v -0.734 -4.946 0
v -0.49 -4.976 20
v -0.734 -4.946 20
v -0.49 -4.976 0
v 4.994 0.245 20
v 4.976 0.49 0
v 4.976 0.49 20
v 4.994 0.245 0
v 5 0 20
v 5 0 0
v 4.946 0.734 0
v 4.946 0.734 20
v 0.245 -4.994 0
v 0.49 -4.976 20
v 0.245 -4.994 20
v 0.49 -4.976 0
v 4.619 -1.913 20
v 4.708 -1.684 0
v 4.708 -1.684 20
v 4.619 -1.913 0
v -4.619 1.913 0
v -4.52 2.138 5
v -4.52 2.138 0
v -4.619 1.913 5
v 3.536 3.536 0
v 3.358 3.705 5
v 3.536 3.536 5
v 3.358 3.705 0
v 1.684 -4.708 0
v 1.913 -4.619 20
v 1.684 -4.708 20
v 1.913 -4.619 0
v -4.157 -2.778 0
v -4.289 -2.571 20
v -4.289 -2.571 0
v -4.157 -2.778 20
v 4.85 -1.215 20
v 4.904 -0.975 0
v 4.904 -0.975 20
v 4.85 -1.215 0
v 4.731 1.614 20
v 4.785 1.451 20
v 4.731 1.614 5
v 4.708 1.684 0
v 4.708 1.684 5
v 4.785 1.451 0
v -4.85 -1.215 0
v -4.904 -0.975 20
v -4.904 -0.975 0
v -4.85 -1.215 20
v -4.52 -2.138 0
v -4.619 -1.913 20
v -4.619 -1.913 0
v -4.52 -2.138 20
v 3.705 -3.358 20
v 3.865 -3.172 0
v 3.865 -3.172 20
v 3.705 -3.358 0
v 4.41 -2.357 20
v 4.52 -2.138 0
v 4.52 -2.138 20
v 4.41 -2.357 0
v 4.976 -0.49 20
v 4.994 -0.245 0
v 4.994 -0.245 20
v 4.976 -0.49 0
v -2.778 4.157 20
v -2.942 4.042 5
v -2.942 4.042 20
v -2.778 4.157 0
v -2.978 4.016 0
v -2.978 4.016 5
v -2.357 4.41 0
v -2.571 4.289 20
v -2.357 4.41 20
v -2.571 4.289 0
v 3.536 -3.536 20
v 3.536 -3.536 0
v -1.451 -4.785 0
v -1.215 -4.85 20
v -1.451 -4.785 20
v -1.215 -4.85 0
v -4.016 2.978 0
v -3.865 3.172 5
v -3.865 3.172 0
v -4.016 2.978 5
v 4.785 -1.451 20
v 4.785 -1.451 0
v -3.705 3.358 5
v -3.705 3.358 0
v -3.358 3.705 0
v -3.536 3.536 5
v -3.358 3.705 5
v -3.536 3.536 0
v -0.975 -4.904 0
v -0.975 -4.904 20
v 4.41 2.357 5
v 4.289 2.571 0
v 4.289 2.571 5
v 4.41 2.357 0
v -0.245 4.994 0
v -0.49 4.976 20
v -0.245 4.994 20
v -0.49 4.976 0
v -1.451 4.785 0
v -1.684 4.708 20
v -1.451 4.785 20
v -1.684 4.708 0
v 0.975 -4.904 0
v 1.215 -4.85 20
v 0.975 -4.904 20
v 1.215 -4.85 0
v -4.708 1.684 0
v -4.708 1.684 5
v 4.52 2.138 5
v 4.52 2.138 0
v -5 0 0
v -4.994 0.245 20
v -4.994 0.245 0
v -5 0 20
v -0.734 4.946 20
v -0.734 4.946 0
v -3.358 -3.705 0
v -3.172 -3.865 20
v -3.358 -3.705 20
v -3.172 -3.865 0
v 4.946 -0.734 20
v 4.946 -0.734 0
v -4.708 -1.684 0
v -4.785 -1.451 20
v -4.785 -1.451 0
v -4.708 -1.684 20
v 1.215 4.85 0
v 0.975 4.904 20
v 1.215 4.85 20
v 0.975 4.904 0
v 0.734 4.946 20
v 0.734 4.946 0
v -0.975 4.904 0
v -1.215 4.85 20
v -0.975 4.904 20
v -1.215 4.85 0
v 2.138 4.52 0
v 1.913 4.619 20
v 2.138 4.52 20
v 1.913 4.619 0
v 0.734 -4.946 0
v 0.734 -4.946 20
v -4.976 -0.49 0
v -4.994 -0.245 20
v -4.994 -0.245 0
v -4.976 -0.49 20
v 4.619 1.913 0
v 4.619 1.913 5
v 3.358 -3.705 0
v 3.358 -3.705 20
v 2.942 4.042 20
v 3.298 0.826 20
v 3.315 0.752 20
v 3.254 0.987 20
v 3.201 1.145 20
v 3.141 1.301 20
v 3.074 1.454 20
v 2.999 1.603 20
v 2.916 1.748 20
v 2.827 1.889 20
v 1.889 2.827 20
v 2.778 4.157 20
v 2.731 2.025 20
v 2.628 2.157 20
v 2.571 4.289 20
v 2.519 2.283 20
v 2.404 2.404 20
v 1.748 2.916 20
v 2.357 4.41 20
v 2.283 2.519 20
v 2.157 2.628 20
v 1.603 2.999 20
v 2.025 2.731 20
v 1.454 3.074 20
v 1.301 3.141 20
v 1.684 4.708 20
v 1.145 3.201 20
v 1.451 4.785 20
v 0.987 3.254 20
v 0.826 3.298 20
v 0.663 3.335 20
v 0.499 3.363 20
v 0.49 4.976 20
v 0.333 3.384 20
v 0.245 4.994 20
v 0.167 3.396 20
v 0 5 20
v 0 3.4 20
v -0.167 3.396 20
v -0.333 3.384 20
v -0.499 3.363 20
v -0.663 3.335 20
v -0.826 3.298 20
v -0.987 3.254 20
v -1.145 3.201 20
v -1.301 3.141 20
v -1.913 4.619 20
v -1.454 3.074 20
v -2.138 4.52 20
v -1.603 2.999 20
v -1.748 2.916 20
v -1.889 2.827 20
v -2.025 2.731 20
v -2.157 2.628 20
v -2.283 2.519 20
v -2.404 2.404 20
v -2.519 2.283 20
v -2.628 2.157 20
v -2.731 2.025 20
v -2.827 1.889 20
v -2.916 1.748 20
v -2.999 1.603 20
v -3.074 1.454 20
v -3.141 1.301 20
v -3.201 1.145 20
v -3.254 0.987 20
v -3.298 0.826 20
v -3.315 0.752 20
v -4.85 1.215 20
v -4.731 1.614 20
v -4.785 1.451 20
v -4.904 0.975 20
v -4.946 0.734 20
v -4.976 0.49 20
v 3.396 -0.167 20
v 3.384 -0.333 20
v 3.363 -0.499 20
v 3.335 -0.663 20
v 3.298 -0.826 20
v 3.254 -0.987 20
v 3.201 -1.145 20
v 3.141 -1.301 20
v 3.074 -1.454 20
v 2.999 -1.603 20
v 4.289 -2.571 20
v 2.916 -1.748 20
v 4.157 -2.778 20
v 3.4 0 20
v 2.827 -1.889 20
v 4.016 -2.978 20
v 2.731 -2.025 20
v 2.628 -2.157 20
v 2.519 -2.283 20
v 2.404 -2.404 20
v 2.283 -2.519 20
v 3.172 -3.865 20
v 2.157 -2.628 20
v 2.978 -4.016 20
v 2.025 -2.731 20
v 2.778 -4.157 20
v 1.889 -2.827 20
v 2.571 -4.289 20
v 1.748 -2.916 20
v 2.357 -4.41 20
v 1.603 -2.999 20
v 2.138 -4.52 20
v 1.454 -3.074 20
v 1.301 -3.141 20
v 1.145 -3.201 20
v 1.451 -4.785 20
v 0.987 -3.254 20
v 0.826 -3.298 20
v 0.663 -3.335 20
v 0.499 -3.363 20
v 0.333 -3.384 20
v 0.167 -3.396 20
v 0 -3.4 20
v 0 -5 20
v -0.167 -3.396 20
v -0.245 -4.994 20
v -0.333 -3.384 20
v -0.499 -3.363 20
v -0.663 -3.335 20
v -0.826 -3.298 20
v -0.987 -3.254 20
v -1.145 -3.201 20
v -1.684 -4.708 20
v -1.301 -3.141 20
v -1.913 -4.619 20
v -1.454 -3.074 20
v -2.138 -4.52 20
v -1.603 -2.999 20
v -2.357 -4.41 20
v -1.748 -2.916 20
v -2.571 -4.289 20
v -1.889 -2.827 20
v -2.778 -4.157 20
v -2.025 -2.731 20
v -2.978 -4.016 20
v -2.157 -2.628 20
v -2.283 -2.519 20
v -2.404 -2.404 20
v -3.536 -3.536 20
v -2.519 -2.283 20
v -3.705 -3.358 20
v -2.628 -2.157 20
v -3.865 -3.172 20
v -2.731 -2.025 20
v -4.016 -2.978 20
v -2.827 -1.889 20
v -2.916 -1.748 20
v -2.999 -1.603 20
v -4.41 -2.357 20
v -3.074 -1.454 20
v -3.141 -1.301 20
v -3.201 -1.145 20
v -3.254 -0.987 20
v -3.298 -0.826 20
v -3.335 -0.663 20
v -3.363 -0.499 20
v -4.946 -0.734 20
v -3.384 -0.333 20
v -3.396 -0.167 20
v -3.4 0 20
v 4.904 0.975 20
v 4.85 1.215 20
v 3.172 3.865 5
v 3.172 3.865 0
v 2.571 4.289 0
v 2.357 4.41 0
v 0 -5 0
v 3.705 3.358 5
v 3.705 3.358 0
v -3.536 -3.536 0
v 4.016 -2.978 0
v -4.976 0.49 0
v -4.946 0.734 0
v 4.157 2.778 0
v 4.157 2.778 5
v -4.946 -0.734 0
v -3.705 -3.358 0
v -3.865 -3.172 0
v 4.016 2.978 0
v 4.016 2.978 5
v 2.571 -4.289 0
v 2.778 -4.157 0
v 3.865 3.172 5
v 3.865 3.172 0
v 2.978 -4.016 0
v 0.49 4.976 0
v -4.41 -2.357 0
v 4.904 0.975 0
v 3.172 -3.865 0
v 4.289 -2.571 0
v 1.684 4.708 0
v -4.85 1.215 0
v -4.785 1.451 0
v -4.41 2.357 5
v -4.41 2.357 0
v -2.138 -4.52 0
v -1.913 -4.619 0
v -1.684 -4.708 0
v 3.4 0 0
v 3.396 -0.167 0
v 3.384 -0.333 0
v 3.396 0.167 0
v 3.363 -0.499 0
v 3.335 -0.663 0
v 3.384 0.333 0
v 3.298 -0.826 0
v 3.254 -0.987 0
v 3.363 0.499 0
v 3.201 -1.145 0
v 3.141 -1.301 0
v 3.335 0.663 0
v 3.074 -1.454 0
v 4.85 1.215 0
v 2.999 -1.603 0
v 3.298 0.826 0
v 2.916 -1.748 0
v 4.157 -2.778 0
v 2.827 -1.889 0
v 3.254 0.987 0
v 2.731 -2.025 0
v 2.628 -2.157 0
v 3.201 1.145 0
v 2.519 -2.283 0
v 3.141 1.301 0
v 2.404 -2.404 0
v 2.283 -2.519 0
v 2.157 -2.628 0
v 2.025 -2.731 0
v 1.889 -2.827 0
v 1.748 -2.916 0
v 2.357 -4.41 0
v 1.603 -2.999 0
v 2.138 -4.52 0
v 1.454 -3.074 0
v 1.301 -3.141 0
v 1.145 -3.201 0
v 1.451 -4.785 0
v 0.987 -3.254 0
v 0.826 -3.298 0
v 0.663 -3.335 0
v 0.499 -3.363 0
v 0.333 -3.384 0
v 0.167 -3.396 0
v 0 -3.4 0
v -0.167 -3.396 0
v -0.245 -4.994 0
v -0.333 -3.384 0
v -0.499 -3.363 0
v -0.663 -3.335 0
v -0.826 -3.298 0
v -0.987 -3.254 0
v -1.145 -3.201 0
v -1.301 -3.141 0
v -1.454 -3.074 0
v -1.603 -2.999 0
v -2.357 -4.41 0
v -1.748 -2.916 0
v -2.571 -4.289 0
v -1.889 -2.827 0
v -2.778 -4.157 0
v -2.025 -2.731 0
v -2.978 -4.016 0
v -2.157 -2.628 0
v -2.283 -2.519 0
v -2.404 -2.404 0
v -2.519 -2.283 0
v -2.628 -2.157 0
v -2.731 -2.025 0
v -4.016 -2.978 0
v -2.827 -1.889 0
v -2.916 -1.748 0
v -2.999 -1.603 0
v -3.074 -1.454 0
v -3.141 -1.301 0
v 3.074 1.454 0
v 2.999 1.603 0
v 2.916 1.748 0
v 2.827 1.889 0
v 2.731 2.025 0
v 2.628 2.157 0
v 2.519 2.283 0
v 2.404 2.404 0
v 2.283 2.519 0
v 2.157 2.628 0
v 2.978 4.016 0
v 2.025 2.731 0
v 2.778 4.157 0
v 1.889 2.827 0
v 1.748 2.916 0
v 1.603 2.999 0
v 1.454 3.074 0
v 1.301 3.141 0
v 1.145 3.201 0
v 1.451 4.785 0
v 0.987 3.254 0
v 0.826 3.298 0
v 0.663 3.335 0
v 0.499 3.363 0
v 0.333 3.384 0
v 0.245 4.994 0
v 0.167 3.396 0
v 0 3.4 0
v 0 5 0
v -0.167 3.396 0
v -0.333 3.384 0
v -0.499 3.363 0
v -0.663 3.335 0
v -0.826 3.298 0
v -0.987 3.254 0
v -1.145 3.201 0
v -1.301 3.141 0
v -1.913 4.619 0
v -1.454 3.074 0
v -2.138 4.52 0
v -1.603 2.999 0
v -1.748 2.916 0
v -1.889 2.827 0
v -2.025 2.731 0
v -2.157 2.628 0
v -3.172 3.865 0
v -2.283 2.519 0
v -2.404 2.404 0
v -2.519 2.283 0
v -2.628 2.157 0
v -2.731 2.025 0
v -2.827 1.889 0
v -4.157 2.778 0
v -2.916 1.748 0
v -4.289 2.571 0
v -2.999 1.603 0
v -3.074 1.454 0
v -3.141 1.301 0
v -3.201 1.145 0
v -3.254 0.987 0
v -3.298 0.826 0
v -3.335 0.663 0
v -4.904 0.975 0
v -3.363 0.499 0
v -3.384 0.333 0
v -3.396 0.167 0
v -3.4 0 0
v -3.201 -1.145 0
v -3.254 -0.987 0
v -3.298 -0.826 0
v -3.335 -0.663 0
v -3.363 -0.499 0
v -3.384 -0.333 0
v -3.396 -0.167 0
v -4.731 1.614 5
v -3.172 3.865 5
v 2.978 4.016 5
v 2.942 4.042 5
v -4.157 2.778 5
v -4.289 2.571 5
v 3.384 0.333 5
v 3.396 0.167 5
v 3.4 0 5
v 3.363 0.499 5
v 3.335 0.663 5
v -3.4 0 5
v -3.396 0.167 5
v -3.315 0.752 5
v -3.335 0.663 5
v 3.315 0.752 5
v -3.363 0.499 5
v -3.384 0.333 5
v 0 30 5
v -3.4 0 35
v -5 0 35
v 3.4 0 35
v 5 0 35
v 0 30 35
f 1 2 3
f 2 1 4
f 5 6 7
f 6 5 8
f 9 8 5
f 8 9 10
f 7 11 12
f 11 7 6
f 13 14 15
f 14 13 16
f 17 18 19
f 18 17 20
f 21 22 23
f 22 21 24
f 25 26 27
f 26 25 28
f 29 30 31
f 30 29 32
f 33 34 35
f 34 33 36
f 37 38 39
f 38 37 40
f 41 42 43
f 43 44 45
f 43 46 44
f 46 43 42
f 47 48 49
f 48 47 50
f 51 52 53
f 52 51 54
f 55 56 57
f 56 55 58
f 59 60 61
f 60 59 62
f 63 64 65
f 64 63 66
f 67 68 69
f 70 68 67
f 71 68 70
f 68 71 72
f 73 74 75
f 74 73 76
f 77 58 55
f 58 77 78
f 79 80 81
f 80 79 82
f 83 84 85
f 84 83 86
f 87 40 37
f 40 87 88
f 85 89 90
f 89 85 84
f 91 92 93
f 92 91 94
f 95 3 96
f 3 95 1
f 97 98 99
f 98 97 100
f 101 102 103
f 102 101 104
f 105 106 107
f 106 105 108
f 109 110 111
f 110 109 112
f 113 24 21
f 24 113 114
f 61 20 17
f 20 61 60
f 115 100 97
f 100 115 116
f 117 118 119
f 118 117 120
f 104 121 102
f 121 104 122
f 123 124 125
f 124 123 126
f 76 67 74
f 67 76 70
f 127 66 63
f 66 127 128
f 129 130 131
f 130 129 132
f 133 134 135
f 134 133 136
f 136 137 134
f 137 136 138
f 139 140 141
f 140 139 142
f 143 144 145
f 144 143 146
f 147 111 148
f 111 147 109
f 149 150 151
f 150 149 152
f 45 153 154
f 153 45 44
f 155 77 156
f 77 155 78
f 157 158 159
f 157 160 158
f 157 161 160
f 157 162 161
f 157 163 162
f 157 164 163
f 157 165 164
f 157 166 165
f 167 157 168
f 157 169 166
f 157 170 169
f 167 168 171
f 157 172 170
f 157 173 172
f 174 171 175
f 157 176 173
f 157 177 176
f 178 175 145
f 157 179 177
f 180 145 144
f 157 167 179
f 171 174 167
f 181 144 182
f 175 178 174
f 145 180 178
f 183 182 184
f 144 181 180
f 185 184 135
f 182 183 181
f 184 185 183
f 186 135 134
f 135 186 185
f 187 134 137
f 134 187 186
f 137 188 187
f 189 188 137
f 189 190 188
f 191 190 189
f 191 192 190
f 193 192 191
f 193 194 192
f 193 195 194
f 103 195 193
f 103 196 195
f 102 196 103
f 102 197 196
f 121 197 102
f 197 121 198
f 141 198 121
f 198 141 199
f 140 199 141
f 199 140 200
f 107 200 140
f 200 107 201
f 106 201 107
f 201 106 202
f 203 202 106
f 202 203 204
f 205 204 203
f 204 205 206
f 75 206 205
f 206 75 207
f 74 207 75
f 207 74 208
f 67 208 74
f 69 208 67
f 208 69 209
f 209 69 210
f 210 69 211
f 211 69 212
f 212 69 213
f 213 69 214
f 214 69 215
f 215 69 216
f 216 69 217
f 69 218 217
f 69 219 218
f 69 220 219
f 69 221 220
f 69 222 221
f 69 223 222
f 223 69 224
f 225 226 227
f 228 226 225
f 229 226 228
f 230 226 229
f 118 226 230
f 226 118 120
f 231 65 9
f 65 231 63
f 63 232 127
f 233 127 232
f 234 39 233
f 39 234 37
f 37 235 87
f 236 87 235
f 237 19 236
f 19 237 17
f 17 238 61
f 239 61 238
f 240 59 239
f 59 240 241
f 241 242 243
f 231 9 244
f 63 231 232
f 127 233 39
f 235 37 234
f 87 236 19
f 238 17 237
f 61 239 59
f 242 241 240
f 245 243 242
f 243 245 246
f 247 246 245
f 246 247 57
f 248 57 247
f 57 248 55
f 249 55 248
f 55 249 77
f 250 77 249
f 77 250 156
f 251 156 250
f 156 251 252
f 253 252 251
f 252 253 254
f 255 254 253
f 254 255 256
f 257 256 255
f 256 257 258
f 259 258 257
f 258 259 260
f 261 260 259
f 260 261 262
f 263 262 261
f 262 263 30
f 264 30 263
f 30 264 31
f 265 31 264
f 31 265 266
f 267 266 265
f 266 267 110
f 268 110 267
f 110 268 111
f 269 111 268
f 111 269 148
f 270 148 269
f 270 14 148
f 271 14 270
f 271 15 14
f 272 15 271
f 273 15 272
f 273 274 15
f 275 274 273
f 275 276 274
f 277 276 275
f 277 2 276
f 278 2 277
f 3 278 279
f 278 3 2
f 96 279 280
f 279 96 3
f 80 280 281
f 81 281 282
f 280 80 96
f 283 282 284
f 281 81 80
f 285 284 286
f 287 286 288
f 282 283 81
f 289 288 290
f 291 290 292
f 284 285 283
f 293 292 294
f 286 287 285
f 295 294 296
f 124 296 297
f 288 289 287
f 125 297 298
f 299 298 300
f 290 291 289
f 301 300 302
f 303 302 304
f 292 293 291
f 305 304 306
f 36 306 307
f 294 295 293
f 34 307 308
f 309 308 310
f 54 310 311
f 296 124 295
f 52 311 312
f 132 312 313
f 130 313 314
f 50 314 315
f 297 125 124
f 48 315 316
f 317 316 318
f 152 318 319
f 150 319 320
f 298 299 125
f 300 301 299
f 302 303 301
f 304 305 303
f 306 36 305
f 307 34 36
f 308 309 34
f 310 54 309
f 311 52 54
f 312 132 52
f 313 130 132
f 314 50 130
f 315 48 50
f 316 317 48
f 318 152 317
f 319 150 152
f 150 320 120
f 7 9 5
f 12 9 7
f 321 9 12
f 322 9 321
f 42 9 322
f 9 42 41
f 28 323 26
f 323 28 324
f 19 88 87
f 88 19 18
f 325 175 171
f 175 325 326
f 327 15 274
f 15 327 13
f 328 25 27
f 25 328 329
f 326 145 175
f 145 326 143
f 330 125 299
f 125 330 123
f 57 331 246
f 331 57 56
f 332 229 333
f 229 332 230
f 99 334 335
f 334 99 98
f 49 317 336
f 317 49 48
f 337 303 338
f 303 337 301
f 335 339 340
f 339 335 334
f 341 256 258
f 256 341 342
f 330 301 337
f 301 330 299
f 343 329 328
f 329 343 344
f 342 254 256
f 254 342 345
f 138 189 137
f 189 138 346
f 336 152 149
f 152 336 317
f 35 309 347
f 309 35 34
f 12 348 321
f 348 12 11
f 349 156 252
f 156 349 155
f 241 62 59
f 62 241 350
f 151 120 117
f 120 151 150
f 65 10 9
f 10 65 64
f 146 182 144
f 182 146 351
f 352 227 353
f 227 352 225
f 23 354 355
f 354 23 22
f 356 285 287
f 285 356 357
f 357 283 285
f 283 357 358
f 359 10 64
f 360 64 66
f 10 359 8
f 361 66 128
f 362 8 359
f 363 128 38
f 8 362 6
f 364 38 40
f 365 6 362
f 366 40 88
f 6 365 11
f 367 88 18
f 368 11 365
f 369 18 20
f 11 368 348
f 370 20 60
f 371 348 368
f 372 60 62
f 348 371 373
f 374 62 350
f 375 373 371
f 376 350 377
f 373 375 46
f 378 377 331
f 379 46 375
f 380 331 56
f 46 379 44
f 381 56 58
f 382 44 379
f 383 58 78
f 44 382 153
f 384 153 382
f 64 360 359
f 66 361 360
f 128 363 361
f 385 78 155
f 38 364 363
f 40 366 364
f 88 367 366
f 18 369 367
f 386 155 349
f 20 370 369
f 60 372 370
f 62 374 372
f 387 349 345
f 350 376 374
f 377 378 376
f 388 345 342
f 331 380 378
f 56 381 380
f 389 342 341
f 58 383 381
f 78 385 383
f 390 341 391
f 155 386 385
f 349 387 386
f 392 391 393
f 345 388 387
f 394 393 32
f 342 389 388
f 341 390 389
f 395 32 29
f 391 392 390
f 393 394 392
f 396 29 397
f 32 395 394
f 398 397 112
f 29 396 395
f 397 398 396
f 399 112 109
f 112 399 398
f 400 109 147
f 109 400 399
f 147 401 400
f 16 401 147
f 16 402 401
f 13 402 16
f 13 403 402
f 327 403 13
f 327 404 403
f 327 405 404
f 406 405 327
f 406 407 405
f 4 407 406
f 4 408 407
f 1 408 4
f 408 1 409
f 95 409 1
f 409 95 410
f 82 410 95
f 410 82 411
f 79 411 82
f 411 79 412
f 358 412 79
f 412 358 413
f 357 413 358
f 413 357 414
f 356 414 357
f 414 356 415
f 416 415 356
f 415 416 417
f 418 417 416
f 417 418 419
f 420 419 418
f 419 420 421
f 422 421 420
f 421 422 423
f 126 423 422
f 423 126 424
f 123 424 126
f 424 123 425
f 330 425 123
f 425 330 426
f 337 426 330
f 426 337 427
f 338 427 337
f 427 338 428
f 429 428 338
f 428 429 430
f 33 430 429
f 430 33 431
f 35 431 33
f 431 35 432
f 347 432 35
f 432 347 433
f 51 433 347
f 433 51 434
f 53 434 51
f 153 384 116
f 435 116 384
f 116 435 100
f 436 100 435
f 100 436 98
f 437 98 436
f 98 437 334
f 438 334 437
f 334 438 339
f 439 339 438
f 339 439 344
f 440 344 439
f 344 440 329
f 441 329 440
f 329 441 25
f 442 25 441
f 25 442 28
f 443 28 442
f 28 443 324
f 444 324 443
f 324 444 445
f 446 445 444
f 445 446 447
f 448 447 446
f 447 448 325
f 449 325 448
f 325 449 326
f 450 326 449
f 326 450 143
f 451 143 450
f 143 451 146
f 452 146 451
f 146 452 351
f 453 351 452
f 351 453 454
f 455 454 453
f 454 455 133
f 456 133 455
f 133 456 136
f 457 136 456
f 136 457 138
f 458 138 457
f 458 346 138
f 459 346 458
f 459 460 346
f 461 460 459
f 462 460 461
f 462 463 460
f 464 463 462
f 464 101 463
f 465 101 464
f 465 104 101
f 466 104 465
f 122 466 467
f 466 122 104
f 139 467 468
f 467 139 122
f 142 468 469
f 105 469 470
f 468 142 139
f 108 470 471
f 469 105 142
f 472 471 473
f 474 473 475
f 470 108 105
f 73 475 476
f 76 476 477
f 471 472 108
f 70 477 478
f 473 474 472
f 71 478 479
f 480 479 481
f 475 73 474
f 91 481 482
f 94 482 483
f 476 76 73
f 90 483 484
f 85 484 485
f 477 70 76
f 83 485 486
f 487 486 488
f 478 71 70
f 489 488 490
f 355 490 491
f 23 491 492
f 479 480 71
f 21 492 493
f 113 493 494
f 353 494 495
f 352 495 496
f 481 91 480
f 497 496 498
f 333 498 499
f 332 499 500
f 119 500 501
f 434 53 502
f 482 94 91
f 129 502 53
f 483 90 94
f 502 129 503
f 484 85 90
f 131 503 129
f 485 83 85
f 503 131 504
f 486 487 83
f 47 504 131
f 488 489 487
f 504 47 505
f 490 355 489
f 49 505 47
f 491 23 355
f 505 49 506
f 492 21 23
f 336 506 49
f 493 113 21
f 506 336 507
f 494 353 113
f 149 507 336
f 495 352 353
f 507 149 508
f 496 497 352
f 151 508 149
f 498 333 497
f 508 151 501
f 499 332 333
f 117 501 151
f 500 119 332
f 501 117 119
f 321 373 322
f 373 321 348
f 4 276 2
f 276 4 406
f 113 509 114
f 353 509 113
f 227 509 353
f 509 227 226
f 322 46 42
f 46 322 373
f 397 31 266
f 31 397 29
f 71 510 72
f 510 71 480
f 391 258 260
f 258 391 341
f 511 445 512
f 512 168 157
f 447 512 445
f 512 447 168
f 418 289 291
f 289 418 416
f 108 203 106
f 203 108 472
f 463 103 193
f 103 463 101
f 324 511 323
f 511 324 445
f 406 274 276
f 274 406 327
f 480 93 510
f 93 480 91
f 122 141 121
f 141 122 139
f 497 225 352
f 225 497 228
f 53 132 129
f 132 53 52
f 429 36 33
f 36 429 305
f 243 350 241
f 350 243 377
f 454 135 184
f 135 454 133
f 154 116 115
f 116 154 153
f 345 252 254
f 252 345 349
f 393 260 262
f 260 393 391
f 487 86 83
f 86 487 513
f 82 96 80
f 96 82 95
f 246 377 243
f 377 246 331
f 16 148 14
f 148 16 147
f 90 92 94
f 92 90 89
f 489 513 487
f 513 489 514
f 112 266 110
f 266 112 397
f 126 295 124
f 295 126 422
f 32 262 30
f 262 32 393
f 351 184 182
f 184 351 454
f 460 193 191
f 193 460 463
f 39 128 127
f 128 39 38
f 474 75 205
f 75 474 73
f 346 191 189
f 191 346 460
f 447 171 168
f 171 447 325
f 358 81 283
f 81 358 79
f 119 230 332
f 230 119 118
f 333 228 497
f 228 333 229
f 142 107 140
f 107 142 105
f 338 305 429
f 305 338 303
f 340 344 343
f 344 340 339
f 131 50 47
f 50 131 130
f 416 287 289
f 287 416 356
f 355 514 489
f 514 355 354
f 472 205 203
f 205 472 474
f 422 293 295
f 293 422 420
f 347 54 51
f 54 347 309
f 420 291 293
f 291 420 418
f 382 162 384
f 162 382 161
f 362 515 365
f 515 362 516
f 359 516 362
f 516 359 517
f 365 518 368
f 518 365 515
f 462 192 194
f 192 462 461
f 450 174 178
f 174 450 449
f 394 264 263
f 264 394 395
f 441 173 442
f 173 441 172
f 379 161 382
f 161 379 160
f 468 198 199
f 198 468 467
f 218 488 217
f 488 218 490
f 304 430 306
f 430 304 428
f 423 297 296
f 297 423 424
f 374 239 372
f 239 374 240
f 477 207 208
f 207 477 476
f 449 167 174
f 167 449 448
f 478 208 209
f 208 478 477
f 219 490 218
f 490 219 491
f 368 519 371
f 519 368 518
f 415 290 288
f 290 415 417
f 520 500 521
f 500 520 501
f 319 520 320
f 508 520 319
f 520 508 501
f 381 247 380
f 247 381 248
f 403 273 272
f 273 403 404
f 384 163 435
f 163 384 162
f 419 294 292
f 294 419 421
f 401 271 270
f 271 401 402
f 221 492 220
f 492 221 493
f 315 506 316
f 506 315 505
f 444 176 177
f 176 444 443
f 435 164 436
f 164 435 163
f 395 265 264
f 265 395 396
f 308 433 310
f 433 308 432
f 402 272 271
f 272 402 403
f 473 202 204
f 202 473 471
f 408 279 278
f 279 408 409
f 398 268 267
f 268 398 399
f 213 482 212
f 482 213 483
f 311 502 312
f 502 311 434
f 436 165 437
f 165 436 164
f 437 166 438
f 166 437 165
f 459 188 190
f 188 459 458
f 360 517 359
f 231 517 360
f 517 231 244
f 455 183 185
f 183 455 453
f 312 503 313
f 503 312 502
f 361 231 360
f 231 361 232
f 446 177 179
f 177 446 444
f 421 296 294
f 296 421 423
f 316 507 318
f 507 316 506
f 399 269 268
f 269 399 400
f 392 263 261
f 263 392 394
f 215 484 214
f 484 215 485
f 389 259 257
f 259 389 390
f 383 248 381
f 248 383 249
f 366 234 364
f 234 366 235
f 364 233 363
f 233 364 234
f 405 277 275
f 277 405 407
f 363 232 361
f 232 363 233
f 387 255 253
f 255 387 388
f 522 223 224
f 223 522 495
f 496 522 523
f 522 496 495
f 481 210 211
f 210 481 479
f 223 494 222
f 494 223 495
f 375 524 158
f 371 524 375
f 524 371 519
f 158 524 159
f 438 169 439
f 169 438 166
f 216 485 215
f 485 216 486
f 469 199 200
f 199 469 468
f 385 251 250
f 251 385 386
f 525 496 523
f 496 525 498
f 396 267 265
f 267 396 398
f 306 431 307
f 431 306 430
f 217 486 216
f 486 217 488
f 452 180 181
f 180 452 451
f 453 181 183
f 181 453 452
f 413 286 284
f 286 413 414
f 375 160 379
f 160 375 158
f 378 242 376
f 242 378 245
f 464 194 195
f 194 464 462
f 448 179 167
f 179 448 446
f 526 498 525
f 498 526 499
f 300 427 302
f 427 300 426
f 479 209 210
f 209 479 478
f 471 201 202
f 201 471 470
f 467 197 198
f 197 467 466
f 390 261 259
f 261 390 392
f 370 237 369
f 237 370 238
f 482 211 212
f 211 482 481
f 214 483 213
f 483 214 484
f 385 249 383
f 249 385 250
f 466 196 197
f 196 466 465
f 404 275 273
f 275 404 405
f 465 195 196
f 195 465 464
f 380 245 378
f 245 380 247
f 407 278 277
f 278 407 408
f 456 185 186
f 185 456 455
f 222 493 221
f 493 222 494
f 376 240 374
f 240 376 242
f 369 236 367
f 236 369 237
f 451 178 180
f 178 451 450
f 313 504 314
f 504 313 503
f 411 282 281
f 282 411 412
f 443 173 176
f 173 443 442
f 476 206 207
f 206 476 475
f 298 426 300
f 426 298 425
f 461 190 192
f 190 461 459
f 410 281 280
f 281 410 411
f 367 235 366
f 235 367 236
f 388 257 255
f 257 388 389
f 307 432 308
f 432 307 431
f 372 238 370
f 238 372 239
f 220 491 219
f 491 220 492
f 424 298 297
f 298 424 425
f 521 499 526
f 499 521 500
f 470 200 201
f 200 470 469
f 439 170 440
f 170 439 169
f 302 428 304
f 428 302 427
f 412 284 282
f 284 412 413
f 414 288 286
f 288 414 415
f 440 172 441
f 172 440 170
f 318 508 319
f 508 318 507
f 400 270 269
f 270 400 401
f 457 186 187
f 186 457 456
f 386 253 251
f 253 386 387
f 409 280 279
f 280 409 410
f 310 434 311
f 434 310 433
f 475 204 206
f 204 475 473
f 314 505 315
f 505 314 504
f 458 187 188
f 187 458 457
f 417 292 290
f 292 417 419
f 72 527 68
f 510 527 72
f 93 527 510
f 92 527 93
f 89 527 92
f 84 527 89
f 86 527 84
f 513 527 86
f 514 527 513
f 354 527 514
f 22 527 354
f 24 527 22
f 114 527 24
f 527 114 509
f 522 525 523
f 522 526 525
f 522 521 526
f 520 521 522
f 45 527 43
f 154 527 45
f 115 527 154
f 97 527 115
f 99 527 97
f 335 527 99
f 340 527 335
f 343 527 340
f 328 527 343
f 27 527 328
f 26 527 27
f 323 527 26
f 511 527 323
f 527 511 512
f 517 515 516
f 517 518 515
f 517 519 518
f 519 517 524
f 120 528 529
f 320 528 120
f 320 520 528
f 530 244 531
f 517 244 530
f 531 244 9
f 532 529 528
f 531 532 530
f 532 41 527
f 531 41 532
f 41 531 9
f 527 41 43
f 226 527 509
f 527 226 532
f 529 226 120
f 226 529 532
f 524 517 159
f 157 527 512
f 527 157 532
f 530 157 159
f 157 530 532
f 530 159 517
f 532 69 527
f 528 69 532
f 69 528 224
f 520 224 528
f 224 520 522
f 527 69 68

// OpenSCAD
// Lab Funnel Design - Corrected
// Units: millimetres
// Orientation: Upright, wide opening at top, resting on XY plane at z=0.

// Dimensions
$fn = 128; // High resolution for smooth curves

// Spout (Tube)
spout_outer_diameter = 10;
spout_inner_diameter = 6.8; // 10 - 2*1.6
spout_length = 20;
spout_wall_thickness = 1.6;

// Cone (Funnel Body)
cone_bottom_diameter = 10; // Matches spout outer diameter
cone_top_diameter = 60;
cone_total_height = 50;     // Total height from z=0 to z=50
cone_wall_thickness = 1.6;

// Helper function to create a hollow cylinder (spout)
module hollow_cylinder(outer_d, inner_d, height) {
    difference() {
        cylinder(h = height, d = outer_d, $fn = $fn);
        cylinder(h = height, d = inner_d, $fn = $fn);
    }
}

// Helper function to create a hollow cone using linear_extrude and polygon
// bottom_d: diameter at the bottom of the cone section
// top_d: diameter at the top of the cone section
// height: height of the cone section
module hollow_cone(bottom_d, top_d, height) {
    difference() {
        // Outer Cone
        // Profile is a triangle defined by points: 
        // (-bottom_d/2, 0), (0, height), (bottom_d/2, 0)
        // We extrude this profile along Z.
        linear_extrude(height = height, center = true) {
            polygon(points = [
                [-bottom_d/2, 0],
                [0, height],
                [bottom_d/2, 0]
            ]);
        }
        
        // Inner Cone (Cutout)
        inner_bottom_d = bottom_d - 2 * cone_wall_thickness;
        inner_top_d = top_d - 2 * cone_wall_thickness;
        
        linear_extrude(height = height, center = true) {
            polygon(points = [
                [-inner_bottom_d/2, 0],
                [0, height],
                [inner_bottom_d/2, 0]
            ]);
        }
    }
}

// Main Assembly
module lab_funnel() {
    union() {
        // 1. The Spout (Tube)
        // Positioned at z=0 to z=20
        translate([0, 0, 0]) {
            hollow_cylinder(
                outer_d = spout_outer_diameter,
                inner_d = spout_inner_diameter,
                height = spout_length
            );
        }
        
        // 2. The Cone
        // Positioned at z=20 to z=50
        // Height of the cone section is 30mm (50 - 20)
        translate([0, 0, 20]) {
            hollow_cone(
                bottom_d = cone_bottom_diameter,
                top_d = cone_top_diameter,
                height = cone_total_height - spout_length
            );
        }
    }
}

// Render the part
lab_funnel();
